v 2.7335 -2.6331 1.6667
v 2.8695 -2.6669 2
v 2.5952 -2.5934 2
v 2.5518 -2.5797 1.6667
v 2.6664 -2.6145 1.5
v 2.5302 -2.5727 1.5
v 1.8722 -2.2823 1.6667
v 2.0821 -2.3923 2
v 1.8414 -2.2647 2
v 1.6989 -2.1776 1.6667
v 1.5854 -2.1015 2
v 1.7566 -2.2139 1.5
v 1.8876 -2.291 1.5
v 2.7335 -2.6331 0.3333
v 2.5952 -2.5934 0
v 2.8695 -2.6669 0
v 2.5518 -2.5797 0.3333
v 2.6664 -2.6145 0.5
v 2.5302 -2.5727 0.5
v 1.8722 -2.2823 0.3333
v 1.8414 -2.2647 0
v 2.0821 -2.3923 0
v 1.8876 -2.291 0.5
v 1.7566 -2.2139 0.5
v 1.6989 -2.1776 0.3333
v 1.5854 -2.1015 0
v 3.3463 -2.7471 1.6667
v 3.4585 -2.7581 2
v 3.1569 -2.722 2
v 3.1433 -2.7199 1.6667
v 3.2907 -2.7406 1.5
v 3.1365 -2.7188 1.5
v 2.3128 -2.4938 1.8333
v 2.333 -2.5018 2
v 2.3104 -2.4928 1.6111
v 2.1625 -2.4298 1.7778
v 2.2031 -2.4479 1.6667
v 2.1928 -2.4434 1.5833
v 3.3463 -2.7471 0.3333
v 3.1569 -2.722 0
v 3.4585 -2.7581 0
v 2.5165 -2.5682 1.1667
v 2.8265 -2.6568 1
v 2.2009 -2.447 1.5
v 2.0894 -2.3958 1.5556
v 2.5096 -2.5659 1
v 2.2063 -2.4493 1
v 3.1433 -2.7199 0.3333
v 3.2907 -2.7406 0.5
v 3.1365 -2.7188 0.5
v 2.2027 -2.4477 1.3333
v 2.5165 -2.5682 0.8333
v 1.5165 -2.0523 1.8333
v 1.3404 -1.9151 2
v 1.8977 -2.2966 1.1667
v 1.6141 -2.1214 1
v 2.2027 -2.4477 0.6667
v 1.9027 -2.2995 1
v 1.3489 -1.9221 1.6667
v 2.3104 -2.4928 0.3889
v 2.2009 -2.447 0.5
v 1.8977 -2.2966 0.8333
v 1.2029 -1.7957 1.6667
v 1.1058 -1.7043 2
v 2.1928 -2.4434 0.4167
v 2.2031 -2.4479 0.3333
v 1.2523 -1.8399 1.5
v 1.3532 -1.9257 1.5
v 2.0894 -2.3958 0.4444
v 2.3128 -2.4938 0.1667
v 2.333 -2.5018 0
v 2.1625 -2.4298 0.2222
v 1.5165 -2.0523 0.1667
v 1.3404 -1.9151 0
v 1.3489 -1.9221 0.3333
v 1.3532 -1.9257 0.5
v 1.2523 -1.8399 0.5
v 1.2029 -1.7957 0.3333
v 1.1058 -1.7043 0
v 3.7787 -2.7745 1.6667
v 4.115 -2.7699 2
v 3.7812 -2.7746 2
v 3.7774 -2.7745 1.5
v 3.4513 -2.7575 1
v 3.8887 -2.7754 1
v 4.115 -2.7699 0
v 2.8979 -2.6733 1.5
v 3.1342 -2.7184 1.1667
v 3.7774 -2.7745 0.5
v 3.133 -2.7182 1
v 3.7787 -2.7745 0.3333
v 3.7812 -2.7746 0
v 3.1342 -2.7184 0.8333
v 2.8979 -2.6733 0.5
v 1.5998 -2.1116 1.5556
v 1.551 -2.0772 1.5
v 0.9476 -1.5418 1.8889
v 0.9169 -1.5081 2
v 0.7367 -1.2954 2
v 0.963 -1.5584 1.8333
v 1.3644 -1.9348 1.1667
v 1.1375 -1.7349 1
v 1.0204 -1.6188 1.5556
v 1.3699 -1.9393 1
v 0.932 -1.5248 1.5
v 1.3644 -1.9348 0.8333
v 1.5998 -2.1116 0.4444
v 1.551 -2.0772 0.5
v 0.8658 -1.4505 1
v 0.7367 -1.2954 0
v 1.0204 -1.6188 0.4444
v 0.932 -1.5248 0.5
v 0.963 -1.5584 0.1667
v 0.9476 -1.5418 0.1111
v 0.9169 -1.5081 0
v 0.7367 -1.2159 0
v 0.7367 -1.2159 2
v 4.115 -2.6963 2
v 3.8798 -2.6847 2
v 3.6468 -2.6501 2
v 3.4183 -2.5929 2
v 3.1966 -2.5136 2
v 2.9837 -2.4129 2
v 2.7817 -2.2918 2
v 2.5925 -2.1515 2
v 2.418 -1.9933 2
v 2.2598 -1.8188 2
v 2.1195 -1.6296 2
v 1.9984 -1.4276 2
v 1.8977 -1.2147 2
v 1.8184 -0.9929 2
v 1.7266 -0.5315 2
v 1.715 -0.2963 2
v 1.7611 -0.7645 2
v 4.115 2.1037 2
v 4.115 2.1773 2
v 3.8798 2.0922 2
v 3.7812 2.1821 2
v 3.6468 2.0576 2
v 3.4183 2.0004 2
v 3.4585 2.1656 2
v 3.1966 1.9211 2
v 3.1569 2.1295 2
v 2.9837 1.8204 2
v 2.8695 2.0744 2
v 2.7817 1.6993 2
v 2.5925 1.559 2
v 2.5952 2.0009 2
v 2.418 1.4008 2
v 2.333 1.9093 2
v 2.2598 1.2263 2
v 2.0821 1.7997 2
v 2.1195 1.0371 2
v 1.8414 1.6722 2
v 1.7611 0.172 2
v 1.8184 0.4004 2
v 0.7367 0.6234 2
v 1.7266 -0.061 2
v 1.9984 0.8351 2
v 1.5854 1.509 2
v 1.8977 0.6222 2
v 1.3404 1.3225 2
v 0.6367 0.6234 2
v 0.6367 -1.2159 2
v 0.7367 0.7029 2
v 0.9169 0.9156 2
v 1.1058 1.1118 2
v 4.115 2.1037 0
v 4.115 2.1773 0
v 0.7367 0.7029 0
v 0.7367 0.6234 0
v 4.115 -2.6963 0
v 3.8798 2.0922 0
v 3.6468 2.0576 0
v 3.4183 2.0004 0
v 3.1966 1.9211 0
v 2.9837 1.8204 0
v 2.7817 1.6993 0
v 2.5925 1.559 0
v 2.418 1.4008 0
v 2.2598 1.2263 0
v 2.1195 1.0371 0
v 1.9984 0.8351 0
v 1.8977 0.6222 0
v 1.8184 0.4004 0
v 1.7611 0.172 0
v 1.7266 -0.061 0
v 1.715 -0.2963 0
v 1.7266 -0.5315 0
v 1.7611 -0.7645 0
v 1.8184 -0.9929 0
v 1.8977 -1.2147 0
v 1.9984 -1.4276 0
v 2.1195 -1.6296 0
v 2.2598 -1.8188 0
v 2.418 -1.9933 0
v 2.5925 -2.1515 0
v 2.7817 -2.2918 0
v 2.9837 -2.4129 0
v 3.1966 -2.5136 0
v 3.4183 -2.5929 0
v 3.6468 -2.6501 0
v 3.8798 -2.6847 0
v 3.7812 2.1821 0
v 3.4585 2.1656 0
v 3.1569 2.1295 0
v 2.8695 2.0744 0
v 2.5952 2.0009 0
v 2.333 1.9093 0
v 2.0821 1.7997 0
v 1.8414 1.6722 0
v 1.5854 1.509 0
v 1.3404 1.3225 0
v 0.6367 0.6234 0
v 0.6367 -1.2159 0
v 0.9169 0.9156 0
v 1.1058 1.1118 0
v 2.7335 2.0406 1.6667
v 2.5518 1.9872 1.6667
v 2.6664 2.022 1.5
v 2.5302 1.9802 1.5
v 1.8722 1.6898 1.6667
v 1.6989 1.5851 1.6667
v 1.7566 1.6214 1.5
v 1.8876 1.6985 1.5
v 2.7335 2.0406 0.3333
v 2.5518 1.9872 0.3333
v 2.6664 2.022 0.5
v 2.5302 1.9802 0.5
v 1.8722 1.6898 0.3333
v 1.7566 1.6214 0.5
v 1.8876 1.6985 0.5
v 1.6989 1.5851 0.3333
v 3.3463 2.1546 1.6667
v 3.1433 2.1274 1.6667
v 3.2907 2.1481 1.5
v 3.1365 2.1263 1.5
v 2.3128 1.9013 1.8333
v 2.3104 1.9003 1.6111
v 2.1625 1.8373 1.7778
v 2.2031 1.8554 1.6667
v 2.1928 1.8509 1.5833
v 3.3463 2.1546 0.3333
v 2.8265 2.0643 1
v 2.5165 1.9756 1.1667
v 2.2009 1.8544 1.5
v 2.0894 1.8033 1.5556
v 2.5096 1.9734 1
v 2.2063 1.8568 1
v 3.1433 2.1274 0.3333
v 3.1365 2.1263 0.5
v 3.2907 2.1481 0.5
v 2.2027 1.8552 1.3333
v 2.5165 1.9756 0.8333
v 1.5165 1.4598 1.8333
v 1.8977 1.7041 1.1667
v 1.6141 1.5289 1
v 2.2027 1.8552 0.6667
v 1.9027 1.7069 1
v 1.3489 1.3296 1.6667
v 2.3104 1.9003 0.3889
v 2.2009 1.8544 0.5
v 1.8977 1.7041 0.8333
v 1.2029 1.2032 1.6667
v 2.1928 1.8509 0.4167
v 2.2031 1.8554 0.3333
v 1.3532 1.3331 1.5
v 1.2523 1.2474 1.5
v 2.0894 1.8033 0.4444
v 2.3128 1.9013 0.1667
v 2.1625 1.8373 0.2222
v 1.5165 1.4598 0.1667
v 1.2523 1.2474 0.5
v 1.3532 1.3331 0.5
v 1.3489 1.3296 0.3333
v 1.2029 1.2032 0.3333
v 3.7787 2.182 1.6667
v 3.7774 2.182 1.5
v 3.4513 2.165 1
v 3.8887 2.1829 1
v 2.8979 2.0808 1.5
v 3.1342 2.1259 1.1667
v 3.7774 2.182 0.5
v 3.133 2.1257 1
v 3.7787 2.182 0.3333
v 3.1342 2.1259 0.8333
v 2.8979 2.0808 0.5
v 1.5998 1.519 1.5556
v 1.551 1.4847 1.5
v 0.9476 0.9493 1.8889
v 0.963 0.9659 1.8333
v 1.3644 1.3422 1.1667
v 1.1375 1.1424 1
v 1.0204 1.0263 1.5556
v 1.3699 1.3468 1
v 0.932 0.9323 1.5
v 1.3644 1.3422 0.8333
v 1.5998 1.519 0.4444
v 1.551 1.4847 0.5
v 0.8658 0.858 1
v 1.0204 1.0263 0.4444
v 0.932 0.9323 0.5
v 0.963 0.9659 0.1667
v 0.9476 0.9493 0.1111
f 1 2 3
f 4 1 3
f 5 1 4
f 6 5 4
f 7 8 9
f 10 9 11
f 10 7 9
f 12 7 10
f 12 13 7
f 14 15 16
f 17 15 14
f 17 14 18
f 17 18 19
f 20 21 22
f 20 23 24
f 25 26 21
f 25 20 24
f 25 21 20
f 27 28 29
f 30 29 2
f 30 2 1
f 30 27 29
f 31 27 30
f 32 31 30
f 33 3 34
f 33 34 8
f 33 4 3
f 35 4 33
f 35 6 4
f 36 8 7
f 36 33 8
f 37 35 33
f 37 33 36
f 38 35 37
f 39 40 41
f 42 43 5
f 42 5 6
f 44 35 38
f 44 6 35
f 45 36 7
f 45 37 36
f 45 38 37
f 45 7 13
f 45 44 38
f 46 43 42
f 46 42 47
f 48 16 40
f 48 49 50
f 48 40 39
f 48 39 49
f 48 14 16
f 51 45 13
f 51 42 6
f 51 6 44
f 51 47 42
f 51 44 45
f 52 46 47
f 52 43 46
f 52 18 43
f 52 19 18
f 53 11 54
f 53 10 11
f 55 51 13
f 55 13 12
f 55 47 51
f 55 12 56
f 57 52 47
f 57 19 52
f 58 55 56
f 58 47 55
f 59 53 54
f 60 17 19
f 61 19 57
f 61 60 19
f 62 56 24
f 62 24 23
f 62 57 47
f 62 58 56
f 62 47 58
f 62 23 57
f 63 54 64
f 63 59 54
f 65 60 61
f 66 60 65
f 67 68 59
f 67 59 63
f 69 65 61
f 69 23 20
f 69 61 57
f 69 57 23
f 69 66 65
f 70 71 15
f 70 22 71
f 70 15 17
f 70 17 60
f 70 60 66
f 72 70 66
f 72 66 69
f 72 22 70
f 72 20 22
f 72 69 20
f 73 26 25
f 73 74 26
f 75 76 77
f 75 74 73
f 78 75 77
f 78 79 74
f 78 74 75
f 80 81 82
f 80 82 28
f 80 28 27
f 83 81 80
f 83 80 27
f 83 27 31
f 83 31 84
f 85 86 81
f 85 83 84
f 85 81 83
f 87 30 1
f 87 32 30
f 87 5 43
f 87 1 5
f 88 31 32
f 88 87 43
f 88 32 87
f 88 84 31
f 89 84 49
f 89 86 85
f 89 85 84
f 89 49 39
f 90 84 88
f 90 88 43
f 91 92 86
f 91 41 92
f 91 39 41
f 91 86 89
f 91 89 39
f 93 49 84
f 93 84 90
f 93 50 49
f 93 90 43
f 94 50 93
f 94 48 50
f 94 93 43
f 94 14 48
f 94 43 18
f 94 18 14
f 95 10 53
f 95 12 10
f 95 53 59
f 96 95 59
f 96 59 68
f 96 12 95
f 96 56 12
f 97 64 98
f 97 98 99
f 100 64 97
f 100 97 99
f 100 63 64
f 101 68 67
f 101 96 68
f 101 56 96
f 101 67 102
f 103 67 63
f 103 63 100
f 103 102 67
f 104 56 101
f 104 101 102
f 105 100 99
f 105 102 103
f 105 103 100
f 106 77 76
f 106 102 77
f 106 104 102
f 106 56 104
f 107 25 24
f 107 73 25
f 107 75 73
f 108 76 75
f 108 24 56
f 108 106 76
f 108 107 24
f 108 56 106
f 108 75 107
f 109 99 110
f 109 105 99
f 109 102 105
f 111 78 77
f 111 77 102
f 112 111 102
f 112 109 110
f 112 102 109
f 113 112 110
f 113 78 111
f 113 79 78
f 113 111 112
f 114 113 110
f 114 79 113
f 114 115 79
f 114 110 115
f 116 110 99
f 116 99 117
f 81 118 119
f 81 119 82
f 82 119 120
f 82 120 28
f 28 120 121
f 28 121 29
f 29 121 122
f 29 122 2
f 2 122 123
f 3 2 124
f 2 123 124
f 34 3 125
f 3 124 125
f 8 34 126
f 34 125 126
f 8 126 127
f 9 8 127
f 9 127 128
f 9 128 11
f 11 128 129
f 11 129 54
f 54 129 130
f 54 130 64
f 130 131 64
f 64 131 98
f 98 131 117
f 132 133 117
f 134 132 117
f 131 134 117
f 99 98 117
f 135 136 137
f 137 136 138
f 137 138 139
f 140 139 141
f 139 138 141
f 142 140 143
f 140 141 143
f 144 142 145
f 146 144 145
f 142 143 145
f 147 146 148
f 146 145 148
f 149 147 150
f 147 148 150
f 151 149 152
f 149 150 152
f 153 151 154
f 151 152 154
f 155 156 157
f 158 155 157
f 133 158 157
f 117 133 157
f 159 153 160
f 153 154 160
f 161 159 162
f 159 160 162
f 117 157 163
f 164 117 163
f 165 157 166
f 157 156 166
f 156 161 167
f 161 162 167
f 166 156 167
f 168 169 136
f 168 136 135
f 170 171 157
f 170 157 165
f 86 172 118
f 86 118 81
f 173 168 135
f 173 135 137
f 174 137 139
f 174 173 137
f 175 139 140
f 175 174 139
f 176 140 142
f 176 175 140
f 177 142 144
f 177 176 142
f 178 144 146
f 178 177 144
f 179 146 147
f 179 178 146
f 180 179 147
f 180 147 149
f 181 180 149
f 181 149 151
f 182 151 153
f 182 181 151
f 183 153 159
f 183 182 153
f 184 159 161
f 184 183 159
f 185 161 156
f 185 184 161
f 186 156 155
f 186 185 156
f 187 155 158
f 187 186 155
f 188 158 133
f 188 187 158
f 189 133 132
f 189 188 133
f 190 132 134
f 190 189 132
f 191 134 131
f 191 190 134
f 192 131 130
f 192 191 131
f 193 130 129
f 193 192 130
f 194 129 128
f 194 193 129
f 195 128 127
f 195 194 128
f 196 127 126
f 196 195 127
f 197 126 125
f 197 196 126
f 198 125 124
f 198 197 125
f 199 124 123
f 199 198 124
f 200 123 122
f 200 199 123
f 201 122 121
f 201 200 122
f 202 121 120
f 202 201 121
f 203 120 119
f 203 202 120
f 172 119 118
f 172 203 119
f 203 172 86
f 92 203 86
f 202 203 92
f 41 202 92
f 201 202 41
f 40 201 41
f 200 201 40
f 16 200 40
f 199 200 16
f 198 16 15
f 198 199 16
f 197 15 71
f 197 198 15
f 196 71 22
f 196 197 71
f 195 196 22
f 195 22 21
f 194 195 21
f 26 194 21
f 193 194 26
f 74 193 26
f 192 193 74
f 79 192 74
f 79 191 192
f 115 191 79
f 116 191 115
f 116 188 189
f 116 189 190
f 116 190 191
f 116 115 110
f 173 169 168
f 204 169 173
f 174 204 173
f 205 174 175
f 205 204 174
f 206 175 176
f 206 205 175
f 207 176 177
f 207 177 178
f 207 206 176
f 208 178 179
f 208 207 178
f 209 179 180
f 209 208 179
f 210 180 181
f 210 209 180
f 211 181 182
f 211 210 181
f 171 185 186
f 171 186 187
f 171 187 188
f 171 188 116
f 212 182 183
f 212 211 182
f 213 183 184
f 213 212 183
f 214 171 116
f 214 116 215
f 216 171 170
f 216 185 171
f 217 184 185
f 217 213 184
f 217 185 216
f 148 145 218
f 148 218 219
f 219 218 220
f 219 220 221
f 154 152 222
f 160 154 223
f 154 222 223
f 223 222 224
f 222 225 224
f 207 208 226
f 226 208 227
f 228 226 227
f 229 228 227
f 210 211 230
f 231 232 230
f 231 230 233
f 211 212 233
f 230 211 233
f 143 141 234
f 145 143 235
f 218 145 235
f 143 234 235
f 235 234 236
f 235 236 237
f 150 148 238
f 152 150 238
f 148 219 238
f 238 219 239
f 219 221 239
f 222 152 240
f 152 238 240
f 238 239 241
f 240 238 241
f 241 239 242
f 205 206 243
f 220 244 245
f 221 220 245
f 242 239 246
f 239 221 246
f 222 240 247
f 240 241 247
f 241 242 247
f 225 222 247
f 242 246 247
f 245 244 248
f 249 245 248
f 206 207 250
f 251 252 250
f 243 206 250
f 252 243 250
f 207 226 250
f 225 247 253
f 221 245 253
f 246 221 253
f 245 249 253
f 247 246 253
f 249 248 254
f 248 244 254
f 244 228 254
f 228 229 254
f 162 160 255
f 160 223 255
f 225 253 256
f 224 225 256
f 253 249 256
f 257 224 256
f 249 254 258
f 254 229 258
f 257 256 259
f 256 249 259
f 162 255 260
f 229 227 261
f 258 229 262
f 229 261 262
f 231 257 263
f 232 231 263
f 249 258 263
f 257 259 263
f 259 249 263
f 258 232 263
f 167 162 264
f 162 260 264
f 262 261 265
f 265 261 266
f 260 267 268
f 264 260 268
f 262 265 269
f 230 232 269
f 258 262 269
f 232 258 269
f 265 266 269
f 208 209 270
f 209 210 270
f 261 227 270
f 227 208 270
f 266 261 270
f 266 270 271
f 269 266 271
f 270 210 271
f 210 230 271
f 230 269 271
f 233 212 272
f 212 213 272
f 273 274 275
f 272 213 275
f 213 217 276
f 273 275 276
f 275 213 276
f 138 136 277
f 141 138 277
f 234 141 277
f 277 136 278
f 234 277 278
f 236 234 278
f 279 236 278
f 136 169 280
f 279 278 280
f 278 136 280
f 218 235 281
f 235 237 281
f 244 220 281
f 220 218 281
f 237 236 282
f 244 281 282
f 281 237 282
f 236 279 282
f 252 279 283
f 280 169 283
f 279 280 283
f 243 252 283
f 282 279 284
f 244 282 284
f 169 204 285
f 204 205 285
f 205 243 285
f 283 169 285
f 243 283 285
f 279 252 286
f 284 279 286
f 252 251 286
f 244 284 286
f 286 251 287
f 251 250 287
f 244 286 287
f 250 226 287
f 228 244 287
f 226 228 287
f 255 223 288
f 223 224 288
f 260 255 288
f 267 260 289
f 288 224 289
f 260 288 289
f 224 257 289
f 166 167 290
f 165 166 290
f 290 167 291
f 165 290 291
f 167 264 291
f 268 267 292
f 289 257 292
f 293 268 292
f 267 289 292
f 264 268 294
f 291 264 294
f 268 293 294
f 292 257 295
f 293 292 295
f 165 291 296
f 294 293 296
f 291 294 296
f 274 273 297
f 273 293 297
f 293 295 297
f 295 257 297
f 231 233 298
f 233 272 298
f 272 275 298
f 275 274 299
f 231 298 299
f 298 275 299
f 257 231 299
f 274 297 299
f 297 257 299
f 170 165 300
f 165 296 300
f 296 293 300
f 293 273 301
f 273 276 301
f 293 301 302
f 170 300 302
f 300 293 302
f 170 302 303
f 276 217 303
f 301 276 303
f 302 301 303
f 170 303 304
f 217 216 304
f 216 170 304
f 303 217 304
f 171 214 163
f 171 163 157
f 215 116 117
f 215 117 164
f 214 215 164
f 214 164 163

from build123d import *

# Parameters (mm, degrees)
BOSS_EXTRUDE1_DEPTH = 2


with BuildPart() as part:
    # Sketch1 → Boss-Extrude1 (new body)
    with BuildSketch(Plane.XY):
        with BuildLine():
            Line((4.115026411, 2.177343501), (4.115026411, 2.103740104))
            ThreePointArc((4.115026411, 2.103740104), (1.715026411, -0.296259896), (4.115026411, -2.696259896))
            Line((4.115026411, -2.696259896), (4.115026411, -2.769863293))
            add(Edge.make_bspline(
                [(4.115026411, -2.769863293), (1.986645095, -2.865928164), (0.736711976, -1.295422853)],
                knots=[0, 0, 0, 1, 1, 1], degree=2))
            Line((0.736711976, -1.295422853), (0.736711976, -1.215894452))
            Line((0.736711976, -1.215894452), (0.636711976, -1.215894452))
            Line((0.636711976, -1.215894452), (0.636711976, 0.62337466))
            Line((0.636711976, 0.62337466), (0.736711976, 0.62337466))
            Line((0.736711976, 0.62337466), (0.736711976, 0.70290306))
            add(Edge.make_bspline(
                [(4.115026411, 2.177343501), (1.986645095, 2.273408372), (0.736711976, 0.70290306)],
                knots=[0, 0, 0, 1, 1, 1], degree=2))
        make_face()
    extrude(amount=BOSS_EXTRUDE1_DEPTH)


solid = part.part
